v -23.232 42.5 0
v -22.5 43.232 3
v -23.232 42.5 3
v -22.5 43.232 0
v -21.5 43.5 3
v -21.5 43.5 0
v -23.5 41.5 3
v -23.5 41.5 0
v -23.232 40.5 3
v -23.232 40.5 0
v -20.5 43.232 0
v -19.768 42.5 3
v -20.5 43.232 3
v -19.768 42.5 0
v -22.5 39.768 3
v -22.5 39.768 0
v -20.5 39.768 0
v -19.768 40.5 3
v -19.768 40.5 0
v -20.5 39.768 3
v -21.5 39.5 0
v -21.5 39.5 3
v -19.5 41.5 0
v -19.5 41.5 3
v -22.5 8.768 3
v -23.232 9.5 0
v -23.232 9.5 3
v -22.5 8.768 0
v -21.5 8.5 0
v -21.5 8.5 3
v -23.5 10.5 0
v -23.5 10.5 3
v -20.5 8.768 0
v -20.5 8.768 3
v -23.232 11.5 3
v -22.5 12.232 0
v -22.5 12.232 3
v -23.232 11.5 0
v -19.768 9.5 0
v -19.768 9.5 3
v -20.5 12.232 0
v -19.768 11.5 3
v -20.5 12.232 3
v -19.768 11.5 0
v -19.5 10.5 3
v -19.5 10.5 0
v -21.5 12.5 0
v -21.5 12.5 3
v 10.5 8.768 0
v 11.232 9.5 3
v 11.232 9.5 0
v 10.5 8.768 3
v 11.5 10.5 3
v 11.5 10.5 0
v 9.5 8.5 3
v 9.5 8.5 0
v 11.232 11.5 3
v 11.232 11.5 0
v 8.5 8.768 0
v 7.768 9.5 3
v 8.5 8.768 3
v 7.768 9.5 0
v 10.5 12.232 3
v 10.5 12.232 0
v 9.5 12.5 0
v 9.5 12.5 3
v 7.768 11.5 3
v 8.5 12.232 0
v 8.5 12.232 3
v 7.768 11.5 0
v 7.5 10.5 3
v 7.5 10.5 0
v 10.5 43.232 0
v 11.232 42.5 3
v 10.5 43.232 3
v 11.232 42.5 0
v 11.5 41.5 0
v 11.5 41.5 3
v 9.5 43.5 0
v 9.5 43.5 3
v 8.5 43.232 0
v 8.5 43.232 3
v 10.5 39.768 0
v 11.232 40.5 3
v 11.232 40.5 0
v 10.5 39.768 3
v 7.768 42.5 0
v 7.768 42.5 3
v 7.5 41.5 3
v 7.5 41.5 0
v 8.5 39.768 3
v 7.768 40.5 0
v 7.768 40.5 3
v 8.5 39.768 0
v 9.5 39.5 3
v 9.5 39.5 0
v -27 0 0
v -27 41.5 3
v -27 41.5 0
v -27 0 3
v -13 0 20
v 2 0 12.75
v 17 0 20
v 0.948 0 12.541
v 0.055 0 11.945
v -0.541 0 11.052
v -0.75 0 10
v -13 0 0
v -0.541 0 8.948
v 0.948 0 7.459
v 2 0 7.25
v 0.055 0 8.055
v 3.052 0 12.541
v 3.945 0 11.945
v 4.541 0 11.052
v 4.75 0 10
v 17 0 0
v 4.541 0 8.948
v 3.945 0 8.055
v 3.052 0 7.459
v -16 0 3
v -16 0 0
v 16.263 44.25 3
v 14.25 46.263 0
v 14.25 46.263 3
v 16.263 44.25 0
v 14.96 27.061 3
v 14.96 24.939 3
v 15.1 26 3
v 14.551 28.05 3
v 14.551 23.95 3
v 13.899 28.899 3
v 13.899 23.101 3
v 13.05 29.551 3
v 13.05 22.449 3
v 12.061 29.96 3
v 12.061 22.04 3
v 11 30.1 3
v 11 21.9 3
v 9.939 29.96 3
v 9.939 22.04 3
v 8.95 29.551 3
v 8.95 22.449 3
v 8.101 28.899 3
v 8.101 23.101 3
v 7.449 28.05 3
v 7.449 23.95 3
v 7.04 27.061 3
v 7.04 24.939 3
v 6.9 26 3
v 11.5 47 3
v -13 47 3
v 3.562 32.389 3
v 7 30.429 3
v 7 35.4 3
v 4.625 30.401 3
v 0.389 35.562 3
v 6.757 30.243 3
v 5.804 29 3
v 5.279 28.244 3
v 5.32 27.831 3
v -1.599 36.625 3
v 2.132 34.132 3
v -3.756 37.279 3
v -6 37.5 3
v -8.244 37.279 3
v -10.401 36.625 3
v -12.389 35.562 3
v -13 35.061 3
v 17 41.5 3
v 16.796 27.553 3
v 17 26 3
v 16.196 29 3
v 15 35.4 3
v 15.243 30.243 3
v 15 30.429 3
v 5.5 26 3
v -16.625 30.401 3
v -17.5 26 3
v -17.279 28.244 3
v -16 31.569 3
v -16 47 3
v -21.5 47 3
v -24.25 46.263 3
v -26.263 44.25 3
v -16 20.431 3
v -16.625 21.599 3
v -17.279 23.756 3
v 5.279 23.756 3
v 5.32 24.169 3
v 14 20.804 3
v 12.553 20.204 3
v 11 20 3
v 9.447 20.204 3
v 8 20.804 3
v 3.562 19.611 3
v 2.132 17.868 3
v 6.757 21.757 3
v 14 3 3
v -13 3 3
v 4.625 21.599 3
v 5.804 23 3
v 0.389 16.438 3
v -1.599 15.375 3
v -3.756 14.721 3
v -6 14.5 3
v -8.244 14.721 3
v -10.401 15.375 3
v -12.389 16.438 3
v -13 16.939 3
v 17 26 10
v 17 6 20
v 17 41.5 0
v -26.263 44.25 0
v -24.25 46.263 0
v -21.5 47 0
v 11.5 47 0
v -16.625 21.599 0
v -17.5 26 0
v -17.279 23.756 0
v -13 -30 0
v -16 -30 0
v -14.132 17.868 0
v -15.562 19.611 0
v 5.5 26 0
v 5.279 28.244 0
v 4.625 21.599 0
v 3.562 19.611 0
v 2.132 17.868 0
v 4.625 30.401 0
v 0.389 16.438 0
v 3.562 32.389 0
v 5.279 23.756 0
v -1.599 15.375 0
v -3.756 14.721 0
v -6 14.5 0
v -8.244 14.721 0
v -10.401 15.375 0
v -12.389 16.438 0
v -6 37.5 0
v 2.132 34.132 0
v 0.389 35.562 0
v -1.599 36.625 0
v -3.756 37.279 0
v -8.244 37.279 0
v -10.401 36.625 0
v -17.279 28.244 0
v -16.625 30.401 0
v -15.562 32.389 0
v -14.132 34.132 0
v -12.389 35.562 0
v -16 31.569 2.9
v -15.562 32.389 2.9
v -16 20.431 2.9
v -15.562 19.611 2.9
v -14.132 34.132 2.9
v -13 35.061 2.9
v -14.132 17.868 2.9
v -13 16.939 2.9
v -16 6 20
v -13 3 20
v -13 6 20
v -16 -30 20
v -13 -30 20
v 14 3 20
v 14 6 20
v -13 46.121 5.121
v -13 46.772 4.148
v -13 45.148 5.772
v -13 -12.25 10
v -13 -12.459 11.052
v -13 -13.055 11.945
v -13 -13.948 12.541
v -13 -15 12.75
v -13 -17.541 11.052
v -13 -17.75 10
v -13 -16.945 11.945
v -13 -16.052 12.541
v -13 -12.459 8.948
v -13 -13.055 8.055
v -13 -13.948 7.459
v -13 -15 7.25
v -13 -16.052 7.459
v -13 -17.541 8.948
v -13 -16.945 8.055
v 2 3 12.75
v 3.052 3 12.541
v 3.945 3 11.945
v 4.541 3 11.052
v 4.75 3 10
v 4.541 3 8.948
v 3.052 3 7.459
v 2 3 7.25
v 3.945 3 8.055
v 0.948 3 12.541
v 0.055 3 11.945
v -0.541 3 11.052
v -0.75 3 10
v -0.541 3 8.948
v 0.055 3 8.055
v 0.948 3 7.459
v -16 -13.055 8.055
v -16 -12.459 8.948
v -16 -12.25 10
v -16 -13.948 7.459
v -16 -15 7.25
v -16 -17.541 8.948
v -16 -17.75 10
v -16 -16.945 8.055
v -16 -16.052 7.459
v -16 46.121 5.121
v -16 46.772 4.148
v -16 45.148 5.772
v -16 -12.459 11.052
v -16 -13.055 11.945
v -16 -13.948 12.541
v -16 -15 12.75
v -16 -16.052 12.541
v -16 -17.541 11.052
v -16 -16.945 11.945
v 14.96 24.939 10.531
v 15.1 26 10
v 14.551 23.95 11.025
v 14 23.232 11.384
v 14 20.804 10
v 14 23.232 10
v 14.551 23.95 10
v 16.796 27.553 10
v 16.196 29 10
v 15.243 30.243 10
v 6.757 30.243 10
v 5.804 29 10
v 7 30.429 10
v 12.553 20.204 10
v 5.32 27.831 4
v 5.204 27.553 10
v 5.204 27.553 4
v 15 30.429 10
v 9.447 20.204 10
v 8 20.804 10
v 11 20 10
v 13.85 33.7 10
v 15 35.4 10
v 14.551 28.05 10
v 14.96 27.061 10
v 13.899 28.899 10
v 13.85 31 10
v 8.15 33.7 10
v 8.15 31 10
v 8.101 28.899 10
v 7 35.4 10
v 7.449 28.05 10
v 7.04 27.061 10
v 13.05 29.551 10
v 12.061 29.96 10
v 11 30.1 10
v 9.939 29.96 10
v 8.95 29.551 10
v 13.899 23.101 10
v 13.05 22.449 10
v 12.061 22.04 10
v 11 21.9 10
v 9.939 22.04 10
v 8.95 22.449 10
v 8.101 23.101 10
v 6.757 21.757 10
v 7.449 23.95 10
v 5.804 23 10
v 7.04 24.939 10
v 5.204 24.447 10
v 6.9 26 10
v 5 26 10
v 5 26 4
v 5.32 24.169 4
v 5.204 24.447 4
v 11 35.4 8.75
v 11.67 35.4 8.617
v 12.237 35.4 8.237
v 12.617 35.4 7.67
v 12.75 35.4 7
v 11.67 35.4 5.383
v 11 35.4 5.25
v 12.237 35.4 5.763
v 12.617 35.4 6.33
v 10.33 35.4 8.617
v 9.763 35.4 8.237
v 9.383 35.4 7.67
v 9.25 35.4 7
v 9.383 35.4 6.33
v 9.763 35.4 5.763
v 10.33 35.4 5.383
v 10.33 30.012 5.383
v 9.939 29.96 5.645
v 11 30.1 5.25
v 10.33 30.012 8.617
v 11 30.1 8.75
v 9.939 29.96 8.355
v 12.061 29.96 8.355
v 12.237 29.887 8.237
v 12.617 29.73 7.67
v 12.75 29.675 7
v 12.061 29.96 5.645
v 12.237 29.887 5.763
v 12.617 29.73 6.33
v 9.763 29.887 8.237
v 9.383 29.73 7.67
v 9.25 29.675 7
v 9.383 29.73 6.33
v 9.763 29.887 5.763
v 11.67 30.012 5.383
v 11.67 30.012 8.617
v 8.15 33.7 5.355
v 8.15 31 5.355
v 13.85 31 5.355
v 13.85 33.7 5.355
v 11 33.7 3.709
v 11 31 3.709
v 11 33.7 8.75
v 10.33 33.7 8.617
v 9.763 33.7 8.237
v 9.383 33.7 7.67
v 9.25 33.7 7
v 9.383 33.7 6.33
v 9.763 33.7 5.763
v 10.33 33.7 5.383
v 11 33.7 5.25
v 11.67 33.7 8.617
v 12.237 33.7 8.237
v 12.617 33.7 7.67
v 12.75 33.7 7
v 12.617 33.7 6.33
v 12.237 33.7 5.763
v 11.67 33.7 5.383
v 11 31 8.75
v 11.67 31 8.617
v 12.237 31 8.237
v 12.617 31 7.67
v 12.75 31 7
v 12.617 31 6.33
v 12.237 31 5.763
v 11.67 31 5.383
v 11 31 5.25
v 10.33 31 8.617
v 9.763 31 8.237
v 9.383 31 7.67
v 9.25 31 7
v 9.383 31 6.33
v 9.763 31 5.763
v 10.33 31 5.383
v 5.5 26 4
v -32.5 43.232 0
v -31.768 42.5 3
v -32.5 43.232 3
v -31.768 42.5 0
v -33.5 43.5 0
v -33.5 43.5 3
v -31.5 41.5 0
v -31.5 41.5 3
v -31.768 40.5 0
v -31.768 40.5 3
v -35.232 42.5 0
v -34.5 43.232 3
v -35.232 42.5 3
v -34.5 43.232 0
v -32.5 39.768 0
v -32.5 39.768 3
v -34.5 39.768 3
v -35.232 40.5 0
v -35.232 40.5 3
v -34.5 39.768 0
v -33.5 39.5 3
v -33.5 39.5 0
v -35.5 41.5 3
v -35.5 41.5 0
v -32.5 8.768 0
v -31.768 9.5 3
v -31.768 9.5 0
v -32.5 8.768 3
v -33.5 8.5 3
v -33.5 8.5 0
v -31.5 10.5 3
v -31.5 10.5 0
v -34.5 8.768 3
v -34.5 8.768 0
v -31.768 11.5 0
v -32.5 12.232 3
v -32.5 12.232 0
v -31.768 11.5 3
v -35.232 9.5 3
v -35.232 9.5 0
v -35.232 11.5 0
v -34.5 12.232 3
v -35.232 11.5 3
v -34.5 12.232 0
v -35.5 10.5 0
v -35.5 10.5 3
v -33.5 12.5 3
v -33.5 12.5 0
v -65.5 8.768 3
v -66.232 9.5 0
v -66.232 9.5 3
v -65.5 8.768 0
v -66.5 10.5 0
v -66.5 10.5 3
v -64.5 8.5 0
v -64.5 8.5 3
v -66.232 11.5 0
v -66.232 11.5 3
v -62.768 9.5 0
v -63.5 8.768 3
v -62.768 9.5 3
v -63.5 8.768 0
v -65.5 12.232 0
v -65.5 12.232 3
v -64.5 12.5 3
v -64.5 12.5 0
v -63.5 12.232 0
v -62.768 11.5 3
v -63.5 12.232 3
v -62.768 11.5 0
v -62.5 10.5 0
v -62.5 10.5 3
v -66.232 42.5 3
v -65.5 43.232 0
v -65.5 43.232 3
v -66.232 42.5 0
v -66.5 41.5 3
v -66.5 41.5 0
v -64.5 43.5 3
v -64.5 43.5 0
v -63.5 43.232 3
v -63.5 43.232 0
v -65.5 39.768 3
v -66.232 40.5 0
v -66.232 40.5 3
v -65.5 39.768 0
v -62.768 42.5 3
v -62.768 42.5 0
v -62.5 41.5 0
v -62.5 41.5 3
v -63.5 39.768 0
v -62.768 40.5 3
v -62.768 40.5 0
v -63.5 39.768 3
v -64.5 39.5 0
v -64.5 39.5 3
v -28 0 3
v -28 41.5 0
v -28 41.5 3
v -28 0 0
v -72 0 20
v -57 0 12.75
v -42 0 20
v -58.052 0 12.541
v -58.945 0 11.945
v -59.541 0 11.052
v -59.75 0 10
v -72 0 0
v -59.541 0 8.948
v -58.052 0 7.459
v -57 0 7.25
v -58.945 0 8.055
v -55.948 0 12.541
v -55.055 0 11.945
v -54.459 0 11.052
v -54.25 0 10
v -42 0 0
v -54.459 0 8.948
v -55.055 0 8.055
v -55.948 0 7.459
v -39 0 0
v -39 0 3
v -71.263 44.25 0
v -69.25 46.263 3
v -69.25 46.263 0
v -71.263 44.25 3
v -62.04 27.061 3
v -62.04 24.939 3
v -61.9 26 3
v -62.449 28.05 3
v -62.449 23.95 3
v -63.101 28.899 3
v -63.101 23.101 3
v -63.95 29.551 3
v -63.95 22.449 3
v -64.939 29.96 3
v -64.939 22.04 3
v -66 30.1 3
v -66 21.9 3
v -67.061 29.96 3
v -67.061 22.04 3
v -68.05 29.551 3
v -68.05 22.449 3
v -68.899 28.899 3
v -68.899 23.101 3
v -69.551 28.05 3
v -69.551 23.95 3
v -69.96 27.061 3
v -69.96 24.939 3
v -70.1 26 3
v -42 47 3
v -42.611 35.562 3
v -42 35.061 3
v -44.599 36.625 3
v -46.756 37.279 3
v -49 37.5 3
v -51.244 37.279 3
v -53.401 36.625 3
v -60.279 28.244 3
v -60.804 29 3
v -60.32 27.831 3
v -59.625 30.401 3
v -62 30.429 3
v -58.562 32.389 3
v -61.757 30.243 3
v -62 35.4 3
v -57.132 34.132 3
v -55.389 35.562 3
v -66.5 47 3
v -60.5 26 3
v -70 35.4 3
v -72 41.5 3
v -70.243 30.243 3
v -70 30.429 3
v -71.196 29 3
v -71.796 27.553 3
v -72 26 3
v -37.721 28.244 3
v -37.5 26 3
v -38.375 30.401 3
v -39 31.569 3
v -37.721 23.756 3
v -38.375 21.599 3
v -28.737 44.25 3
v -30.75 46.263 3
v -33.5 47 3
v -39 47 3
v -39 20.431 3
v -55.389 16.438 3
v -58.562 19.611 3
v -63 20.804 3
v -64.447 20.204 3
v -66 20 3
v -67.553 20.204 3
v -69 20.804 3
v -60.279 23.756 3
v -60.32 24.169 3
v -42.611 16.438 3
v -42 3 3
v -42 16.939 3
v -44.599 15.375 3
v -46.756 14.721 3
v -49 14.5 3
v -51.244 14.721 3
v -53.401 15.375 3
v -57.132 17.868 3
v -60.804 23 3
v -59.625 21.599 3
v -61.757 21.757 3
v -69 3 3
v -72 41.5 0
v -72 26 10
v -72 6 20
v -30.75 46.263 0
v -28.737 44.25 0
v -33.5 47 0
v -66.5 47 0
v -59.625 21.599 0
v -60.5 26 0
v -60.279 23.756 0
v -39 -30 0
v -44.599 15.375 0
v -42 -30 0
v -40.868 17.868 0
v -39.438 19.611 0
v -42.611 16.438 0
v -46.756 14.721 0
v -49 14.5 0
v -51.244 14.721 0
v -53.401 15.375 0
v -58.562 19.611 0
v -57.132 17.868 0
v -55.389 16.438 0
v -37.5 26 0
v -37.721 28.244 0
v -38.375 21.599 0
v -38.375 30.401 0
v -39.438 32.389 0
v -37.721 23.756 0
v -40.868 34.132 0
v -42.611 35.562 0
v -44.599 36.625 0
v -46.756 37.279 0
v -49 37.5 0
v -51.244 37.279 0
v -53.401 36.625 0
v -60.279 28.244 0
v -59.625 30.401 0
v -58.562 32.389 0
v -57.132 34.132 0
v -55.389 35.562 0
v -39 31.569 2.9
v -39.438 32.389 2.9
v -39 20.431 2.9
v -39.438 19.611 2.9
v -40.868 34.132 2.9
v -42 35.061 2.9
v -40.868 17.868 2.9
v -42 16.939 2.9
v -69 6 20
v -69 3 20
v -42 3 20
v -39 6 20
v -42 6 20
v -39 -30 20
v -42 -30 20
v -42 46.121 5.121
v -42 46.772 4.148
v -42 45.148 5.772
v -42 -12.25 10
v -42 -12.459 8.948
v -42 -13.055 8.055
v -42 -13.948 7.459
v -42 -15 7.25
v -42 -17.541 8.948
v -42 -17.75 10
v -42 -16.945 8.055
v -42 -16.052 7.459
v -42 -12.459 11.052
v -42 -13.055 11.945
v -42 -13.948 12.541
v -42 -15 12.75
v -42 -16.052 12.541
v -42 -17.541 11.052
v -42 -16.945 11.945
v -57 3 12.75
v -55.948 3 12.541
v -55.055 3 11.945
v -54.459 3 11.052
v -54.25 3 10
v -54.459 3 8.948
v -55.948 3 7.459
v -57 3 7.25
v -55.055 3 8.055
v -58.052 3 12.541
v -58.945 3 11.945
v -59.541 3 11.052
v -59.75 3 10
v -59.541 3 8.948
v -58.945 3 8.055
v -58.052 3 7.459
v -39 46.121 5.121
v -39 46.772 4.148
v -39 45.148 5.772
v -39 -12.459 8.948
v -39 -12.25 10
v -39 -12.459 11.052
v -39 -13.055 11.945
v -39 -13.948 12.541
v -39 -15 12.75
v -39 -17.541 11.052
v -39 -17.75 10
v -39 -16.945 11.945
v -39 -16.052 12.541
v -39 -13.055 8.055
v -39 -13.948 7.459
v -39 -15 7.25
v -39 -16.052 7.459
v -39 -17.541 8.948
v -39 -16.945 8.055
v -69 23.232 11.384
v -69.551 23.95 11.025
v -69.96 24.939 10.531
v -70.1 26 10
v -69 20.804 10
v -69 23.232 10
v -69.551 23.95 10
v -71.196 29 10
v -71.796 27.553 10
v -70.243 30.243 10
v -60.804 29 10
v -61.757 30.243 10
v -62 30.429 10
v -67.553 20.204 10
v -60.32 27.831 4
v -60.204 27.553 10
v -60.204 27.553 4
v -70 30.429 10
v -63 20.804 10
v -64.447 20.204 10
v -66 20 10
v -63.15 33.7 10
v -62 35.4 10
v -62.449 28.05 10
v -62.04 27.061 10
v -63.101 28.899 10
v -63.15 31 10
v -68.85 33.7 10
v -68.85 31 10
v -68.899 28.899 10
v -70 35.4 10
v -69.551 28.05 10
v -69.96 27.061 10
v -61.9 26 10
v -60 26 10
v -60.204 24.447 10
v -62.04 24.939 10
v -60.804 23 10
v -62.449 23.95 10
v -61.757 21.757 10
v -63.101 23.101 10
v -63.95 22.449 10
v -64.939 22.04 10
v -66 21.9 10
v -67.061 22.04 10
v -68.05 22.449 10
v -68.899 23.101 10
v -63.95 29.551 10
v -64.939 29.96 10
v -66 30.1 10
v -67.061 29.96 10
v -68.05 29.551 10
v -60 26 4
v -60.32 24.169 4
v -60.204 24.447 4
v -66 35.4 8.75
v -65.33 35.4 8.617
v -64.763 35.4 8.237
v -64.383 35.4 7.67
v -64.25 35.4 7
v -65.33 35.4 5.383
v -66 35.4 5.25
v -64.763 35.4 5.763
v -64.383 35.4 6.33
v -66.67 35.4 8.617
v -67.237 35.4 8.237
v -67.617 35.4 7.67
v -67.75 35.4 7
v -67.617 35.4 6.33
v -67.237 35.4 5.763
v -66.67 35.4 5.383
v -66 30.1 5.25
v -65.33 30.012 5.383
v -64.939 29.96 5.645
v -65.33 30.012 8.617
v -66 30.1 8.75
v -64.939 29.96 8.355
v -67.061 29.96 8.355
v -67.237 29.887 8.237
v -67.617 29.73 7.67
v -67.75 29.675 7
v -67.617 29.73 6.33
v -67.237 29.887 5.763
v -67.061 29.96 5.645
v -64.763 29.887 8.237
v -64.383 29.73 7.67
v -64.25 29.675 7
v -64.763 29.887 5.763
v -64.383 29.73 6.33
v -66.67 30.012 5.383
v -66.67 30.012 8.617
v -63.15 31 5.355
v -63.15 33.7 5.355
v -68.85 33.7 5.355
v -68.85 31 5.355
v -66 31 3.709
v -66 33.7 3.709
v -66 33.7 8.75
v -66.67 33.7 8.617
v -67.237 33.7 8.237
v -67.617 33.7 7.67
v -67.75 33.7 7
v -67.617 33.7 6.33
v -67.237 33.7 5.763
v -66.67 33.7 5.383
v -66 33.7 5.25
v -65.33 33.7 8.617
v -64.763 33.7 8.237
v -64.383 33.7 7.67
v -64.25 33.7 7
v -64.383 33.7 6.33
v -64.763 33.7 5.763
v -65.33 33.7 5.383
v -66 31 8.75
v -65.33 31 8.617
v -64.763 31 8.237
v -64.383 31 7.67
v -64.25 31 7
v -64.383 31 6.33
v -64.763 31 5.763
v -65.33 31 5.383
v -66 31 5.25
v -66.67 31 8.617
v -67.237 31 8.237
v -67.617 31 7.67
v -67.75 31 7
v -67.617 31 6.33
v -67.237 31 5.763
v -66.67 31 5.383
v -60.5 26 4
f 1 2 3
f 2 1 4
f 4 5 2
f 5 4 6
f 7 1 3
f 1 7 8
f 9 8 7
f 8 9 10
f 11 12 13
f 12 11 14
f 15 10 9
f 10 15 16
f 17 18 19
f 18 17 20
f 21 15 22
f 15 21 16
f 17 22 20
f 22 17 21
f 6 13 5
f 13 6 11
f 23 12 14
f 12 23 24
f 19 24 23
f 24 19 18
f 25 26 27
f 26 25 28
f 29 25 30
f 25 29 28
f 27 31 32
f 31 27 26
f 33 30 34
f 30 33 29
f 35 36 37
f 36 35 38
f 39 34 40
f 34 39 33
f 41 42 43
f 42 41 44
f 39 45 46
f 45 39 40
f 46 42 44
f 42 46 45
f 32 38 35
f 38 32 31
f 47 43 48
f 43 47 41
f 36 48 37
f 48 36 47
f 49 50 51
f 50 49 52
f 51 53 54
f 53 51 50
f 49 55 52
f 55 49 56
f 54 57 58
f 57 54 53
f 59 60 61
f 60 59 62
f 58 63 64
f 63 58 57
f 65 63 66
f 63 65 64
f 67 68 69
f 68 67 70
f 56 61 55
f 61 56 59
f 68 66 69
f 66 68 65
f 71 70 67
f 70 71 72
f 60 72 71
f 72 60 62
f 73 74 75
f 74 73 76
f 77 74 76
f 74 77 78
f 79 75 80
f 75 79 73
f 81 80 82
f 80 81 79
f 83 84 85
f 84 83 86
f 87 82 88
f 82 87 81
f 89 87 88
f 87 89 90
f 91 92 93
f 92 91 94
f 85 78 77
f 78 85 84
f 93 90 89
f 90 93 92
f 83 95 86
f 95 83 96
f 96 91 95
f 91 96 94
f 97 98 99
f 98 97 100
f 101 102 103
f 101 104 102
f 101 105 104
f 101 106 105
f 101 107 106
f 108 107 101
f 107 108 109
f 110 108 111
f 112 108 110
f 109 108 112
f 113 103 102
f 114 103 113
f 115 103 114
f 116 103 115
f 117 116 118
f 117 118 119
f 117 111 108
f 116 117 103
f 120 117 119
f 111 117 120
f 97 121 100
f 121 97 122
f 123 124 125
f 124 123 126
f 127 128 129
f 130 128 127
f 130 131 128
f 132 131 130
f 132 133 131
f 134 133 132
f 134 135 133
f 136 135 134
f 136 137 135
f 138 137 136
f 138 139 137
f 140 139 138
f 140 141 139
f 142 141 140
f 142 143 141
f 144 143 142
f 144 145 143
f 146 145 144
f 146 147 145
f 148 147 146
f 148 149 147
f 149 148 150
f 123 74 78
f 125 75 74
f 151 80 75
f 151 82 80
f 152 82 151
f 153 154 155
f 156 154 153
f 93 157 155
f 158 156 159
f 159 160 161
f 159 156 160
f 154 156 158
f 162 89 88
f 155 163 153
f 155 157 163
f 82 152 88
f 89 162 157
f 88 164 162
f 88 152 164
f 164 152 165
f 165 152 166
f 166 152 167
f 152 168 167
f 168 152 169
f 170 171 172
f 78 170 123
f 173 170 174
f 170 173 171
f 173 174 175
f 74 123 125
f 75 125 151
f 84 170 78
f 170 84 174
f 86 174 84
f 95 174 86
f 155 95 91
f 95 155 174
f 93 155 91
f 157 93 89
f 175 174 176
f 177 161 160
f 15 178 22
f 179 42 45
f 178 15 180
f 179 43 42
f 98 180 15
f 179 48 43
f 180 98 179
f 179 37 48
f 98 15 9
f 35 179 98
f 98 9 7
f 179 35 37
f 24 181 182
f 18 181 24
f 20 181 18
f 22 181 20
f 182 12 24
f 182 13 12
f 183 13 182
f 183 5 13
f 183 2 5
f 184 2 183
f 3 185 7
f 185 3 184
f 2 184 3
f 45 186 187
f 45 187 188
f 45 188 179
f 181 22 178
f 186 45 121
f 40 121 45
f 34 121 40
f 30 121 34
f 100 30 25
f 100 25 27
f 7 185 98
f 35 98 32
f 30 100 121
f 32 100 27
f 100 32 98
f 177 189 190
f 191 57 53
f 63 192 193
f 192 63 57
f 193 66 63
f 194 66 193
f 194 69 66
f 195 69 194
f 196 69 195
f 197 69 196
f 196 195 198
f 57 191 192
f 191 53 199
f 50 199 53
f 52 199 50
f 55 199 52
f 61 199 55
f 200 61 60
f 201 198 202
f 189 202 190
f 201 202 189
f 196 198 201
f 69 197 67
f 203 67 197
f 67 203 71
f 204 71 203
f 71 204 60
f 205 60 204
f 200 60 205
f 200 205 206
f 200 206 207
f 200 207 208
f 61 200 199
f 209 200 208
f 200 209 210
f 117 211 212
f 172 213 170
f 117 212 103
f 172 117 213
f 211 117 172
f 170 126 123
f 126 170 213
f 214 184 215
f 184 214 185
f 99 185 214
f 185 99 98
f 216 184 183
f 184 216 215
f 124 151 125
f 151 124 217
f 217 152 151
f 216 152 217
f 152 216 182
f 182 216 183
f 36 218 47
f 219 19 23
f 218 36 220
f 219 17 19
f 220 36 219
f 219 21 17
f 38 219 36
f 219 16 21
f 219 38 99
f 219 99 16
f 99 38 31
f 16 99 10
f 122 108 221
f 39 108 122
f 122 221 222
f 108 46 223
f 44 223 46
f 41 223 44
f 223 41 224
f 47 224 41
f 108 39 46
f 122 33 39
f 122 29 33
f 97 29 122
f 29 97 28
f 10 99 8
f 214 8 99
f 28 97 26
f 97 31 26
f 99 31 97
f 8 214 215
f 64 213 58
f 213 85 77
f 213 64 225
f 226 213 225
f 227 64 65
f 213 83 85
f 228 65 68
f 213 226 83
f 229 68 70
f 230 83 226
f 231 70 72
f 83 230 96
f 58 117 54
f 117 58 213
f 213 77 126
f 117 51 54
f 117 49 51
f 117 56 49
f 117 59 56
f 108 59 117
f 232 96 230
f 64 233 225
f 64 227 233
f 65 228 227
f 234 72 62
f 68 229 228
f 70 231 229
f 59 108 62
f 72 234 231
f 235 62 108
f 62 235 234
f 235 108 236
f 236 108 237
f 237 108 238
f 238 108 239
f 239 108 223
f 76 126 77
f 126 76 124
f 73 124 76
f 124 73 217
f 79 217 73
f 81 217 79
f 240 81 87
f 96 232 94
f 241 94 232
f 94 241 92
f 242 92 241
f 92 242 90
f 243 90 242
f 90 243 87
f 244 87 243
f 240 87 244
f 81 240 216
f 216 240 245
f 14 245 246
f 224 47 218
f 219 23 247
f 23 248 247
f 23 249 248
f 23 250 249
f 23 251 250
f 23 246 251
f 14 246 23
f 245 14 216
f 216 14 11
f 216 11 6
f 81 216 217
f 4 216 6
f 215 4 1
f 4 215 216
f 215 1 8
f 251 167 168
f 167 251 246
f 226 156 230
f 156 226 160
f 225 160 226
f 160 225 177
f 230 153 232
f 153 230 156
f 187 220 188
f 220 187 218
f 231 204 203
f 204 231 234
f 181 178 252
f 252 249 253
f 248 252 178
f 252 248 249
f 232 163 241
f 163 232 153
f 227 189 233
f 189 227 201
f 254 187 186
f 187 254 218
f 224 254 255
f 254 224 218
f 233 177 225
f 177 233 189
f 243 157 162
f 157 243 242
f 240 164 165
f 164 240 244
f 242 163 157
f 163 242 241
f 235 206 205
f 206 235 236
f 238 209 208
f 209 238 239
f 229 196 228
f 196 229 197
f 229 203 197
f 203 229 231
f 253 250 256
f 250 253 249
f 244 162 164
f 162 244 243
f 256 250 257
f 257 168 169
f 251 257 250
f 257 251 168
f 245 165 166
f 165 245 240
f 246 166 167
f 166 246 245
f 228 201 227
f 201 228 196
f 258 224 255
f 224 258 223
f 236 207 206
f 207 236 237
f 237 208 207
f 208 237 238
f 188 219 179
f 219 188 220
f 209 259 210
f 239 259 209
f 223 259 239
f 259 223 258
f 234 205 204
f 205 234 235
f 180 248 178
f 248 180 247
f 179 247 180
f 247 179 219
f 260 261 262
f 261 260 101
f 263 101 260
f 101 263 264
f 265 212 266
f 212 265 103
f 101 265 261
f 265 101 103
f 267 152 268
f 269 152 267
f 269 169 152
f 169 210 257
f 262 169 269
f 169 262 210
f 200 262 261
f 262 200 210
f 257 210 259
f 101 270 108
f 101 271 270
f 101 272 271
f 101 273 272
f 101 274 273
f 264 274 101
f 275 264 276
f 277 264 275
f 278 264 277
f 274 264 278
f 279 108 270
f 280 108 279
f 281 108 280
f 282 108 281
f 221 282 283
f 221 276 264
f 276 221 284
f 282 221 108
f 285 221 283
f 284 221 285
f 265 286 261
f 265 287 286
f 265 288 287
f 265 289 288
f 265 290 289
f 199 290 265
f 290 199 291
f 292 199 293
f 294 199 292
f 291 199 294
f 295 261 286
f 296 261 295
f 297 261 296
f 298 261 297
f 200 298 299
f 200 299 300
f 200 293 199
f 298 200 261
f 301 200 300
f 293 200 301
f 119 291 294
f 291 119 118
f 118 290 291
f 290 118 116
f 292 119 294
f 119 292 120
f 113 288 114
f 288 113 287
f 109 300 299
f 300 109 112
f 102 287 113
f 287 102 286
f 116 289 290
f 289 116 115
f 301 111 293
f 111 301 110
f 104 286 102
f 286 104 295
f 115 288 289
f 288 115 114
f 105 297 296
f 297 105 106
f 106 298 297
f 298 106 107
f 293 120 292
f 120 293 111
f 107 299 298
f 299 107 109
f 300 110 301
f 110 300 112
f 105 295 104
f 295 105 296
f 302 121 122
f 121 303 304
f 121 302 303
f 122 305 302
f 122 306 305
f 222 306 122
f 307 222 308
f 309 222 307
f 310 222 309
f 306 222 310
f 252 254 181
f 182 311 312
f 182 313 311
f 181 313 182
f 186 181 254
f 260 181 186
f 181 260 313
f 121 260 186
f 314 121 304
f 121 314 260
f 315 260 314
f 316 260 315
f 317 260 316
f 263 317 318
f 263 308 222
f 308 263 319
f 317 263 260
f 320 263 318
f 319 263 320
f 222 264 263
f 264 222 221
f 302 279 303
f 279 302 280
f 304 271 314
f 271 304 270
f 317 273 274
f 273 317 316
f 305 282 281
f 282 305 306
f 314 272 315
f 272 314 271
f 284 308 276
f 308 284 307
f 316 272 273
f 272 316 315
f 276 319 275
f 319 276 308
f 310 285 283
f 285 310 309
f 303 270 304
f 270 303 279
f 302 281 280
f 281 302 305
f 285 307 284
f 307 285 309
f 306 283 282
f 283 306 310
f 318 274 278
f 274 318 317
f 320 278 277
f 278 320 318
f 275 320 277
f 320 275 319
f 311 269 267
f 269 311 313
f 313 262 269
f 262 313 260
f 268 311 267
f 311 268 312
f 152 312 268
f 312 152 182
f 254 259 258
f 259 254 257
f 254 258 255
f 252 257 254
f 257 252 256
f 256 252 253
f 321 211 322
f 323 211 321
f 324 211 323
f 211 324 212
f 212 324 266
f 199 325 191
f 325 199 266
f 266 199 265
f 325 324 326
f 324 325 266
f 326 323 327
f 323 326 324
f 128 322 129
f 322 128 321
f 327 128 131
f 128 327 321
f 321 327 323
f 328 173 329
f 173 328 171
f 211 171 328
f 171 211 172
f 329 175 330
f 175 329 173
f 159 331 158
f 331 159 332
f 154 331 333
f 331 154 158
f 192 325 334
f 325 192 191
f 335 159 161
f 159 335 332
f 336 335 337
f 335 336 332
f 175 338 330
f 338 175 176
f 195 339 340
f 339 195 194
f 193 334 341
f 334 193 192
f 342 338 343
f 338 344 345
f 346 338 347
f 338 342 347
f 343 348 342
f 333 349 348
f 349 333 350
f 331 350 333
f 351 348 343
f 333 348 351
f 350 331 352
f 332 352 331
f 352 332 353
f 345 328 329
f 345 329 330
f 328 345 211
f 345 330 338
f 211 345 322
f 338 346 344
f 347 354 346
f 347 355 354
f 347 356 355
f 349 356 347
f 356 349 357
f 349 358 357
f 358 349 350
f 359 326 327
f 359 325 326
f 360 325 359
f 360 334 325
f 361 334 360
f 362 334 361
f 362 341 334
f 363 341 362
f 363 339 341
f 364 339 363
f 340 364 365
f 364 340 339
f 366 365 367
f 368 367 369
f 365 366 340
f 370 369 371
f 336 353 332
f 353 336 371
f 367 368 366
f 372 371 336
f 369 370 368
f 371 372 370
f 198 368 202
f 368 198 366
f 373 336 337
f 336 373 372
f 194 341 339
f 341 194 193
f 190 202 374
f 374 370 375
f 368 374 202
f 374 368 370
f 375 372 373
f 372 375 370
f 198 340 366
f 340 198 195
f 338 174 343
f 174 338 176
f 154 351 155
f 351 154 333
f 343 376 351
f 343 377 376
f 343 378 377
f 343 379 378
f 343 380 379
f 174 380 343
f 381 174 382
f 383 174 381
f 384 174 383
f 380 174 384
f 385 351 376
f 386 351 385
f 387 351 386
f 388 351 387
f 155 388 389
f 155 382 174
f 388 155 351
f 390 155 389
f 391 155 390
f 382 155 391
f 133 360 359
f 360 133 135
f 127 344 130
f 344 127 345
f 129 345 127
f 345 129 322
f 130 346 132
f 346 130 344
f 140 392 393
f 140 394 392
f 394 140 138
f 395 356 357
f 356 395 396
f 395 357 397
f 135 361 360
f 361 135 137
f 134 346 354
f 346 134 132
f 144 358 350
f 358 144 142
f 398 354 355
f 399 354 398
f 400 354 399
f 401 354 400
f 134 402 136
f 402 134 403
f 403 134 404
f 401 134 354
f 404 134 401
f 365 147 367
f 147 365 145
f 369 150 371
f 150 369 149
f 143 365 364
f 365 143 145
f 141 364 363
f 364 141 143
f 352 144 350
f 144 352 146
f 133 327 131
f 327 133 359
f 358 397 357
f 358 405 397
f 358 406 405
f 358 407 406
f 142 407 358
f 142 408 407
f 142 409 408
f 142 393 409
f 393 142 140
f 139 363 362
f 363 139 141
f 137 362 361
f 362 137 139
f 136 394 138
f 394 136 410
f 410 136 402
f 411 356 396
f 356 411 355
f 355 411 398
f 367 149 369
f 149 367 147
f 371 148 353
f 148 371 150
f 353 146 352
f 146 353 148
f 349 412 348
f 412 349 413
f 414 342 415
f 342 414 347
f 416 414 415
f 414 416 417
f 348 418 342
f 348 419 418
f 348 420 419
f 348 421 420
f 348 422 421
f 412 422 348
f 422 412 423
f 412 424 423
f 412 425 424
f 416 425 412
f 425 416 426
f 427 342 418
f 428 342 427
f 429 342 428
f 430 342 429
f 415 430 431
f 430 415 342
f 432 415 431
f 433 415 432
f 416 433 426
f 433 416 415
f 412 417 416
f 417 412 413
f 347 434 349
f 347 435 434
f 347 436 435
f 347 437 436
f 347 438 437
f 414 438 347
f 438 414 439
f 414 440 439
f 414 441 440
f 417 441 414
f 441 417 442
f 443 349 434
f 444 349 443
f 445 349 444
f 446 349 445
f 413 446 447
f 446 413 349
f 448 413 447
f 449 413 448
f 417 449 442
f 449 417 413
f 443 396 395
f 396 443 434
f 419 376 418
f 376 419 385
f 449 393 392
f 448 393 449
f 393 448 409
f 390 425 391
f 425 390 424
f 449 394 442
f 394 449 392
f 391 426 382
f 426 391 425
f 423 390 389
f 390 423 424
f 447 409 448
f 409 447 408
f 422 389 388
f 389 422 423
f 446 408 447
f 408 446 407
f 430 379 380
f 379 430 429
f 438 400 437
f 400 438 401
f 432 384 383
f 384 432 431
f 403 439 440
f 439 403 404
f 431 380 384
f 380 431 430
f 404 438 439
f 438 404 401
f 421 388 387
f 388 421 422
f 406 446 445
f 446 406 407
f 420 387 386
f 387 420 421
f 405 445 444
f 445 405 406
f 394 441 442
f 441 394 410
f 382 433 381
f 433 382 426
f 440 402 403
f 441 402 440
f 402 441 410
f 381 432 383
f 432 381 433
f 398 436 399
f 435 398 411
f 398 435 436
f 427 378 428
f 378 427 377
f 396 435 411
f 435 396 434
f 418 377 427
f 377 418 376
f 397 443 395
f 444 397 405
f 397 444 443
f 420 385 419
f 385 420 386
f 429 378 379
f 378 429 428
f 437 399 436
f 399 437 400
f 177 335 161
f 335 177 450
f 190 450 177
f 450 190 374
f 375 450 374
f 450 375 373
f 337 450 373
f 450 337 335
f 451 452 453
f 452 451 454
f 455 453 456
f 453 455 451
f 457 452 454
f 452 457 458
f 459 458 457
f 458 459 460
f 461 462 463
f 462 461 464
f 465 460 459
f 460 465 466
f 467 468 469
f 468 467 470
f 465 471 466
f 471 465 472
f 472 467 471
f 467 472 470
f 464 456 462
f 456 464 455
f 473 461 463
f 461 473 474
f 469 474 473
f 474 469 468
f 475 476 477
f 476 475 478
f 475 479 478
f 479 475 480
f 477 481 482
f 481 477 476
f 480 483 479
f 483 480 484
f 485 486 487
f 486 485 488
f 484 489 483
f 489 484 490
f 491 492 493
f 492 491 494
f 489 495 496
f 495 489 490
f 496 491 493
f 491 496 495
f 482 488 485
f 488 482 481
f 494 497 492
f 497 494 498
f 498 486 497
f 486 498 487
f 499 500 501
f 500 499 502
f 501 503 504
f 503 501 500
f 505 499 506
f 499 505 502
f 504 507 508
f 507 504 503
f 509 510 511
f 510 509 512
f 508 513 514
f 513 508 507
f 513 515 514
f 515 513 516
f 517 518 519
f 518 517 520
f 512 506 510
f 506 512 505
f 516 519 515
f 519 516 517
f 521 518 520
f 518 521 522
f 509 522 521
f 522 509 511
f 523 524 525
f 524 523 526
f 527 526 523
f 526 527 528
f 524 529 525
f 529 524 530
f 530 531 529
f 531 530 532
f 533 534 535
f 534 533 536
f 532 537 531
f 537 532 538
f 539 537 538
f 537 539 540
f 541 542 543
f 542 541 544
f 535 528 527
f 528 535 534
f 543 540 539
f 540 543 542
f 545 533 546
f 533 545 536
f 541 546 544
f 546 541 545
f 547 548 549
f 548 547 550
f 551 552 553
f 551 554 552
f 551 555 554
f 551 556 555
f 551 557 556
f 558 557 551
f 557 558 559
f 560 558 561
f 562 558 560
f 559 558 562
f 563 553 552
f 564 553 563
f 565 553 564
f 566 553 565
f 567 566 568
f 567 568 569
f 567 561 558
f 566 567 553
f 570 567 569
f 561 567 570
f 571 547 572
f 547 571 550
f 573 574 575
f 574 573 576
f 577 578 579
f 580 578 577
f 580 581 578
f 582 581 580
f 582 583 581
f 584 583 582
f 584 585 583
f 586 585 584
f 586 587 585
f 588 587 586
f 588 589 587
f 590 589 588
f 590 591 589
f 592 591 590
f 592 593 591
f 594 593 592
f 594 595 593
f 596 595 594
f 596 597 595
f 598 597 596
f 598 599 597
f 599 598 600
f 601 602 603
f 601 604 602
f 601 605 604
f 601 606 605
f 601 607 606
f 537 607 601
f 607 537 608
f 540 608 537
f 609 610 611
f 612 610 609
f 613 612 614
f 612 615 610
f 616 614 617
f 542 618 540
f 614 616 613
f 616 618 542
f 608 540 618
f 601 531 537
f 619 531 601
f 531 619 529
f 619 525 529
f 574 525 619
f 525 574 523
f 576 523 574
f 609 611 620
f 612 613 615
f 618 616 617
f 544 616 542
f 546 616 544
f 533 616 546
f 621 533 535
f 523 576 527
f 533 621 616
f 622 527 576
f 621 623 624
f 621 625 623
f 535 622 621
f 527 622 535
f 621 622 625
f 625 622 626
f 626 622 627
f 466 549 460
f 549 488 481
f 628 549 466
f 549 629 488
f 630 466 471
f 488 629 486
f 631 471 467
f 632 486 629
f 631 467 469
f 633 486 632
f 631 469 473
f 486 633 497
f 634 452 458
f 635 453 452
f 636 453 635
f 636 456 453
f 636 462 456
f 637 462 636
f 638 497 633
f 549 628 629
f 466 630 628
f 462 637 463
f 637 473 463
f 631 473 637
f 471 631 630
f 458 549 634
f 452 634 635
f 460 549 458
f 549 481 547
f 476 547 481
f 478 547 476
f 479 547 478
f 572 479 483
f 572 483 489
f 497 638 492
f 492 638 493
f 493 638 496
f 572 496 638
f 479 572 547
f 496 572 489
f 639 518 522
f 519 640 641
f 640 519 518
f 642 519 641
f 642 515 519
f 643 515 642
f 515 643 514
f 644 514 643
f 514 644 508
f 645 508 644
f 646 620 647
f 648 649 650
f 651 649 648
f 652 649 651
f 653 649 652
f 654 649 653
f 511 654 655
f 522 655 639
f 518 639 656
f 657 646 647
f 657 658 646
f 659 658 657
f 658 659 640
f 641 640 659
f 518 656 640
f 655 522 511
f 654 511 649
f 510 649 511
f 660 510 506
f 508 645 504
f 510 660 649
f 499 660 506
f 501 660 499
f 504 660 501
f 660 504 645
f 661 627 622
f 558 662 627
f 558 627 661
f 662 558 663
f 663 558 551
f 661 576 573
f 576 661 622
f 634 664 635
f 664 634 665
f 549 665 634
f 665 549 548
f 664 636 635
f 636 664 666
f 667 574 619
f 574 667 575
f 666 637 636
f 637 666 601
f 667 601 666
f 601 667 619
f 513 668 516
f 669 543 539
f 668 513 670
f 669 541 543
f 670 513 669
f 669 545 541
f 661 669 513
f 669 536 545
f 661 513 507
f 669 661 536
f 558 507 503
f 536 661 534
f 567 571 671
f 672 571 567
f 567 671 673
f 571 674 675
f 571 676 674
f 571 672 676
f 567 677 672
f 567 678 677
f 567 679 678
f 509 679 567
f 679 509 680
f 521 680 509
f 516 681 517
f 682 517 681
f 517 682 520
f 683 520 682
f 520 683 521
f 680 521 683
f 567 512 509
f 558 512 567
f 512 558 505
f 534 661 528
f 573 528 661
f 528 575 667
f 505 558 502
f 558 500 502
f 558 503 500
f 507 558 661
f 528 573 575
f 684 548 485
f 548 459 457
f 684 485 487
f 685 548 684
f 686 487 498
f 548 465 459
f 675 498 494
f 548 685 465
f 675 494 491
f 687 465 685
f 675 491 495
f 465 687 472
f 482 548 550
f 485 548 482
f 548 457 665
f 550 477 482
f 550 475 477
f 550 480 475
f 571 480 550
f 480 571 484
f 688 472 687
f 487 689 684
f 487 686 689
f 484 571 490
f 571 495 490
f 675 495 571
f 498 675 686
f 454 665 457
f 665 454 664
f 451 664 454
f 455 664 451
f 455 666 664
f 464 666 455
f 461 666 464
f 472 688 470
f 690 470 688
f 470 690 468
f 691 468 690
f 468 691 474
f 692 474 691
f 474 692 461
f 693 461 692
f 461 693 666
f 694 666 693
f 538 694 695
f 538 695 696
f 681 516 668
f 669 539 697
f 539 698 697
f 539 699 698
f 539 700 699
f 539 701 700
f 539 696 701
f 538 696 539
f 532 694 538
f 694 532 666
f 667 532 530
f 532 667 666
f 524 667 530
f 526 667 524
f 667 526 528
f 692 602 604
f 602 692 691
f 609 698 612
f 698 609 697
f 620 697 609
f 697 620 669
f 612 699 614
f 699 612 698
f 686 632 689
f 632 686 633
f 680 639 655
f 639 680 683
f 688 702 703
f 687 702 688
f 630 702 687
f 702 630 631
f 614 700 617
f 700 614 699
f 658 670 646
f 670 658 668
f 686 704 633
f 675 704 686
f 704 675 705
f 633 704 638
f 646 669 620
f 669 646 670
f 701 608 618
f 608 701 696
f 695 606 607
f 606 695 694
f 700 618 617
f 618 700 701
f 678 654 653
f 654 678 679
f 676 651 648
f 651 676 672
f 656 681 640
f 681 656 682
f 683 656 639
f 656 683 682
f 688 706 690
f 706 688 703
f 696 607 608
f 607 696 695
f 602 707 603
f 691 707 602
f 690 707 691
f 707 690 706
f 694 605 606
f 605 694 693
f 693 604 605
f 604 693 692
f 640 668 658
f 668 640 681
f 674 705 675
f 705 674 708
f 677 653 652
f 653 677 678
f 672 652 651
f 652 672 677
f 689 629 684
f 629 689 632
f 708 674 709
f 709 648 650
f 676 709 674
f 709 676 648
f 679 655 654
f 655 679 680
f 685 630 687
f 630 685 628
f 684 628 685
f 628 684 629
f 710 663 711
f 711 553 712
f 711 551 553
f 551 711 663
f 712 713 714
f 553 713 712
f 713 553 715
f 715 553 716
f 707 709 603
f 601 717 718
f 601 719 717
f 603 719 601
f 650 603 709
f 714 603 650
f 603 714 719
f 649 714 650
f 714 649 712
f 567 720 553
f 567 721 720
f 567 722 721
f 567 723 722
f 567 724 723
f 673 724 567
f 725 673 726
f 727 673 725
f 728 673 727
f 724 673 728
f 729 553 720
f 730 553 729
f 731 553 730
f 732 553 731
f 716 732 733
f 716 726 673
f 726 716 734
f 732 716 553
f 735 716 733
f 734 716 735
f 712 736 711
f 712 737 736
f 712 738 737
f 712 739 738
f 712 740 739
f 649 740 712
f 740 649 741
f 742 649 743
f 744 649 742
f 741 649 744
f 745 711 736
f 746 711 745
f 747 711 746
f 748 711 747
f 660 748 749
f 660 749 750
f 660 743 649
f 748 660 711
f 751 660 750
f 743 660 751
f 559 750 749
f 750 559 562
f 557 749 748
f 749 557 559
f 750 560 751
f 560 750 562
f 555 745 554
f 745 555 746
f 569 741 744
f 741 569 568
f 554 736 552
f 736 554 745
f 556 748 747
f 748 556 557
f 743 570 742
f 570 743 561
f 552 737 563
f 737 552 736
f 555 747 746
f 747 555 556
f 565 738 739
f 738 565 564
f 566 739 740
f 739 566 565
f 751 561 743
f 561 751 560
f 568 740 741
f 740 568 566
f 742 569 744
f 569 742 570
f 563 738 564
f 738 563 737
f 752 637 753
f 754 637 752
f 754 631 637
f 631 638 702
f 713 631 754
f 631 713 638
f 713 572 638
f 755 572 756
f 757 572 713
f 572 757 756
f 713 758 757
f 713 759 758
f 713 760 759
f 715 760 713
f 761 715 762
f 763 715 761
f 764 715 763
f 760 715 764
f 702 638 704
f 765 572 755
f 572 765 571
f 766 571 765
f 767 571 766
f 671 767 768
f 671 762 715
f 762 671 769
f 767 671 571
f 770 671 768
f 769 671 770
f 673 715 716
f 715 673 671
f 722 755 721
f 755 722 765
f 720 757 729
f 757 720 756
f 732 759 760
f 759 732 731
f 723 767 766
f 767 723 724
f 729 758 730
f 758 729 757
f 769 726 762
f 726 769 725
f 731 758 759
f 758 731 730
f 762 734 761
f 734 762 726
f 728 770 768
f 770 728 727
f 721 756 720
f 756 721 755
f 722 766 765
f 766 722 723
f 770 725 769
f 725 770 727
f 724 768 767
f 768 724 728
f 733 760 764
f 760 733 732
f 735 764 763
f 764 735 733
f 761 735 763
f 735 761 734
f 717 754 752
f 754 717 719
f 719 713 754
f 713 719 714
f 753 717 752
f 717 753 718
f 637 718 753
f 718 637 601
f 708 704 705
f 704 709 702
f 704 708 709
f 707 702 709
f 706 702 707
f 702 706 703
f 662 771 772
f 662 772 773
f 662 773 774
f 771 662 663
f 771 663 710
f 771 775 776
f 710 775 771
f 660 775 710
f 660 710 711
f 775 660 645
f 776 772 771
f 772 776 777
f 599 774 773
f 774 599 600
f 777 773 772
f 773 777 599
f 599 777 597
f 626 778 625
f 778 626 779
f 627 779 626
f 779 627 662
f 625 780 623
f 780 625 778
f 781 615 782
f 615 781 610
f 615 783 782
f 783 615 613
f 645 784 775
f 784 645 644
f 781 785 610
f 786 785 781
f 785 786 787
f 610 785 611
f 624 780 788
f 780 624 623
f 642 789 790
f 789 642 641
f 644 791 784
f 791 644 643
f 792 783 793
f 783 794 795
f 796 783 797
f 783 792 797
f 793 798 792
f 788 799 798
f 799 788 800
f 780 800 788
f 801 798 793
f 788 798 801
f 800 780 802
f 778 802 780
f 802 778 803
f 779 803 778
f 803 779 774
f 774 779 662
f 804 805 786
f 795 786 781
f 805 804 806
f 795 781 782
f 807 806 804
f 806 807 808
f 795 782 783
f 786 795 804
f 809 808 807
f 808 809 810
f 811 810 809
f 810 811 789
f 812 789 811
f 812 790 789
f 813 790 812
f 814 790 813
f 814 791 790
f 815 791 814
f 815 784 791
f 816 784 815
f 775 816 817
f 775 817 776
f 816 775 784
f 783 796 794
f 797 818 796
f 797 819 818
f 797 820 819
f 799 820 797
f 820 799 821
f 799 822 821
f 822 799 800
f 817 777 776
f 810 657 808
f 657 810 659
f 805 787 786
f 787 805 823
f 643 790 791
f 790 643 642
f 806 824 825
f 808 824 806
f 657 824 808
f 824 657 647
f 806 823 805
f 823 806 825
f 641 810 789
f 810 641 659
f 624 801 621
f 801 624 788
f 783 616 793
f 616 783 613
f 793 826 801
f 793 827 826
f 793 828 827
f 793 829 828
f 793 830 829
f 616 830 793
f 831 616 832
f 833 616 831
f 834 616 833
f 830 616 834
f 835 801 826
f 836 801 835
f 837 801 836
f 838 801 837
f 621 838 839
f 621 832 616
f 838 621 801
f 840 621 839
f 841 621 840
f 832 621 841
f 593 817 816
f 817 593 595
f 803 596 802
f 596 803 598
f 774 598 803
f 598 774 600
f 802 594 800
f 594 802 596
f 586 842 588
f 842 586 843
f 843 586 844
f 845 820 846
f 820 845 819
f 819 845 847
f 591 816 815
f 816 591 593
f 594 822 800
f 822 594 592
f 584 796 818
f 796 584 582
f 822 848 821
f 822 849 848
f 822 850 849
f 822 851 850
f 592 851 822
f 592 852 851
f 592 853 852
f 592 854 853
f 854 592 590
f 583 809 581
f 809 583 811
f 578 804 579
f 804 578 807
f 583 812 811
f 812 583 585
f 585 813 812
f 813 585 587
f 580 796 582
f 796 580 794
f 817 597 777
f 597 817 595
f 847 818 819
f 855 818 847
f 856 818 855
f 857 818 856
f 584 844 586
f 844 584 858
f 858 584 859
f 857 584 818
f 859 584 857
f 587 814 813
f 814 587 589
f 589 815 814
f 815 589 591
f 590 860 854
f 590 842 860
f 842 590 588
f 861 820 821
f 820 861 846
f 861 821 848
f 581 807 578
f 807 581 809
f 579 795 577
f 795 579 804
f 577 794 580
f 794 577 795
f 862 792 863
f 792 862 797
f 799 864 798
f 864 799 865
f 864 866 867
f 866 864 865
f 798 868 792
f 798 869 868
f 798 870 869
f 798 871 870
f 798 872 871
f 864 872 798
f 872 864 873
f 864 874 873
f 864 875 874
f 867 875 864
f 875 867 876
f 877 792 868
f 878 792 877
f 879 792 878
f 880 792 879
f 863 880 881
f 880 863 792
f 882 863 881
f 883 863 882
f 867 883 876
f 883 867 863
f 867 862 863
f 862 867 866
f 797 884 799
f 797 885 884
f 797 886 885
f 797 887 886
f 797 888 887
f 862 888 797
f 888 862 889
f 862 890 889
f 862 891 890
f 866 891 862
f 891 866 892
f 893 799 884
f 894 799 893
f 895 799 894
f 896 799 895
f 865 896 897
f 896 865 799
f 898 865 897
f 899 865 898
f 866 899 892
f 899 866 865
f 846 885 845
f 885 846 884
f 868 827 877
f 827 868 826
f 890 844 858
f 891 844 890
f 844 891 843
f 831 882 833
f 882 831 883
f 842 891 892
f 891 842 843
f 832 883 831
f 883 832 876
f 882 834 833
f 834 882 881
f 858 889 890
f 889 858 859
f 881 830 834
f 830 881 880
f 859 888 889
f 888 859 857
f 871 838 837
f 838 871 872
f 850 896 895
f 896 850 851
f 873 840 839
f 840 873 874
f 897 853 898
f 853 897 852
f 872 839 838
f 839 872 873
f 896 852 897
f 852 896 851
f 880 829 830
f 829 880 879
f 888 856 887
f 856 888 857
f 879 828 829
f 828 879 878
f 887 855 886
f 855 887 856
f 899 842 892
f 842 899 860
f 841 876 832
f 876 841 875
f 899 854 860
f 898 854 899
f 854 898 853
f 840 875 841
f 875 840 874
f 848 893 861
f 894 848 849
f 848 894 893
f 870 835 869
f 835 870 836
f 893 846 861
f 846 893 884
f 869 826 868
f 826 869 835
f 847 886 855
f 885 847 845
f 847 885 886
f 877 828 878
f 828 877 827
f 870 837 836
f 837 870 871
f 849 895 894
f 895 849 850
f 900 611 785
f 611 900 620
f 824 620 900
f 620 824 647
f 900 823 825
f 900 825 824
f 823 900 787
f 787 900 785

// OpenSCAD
// file: modules.scad
// Fonctions personnalisées

//http://forum.openscad.org/Wish-mirror-copy-true-td10681.html
module copy_mirror(vec=[0,1,0])
{
    children();
    mirror(vec) children();
}

module ecrou(plat,h){
  cylinder(d=plat*2/sqrt(3), h=h, $fn=6);
}


module courroie(diam,longueur){
  color ("black")
  difference(){
    hull(){
      cylinder(d=diam+1, h=6, $fn=32);
      translate([longueur,0,0]) cylinder(d=diam+1, h=6, $fn=32);
    }
    translate([0,0,-1])
    hull(){
      cylinder(d=diam-1, h=8, $fn=32);
      translate([longueur,0,0]) cylinder(d=diam-1, h=8, $fn=32);
    }
  }
  
  
}
// file: config.scad
// Paramètres de la machine

decal=-30;            // décallage du chassis xz
hauteur=400;          // hauteur totale chassis
largeur=400;          // largeur totale chassis
longueur=470;         // longueur totale chassis
hauteur_base=90;      // hauteur de la base
entraxe_y=140;        // distance entre les tiges Ø8 axe Y
entraxe_x=45;         // distance entre les tiges Ø8 axe X

couleur=[1,0.6,0];


// Plats écrous
ec3=5.7;
ec4=7.2;
ec5=8.2;
ec6=10.2;

// Jeu sur plats pour les écrous glissants
jec=0.2;

// hauteur écrous
ec3h=2.4;
ec4h=3.2;
ec5h=4.7;
ec6h=5.2;

// Vis
vis3=3.5;
vis4=4.5;
vis5=5.5;
vis6=6.5;


// Paramètre des pièces et jeux

// écart plateau/courroie
// y_belt_holder
belt_h=13;      // écart entre la courroie et le plateau

// écart plateau/tiges lisses
// y_lm8uu
decal_plateau=12; // Décallage en Y

// décallage des tiges lisses Y
// support_tige8_y
decal_tiges=5;

// décallage moteur Y
// y_motor
decal_motory_z=11;
decal_motory_y=25;

// Equerres de fixation position fermée
eq_ec=10;      // écart entre profilés

// Fixations axe Z
pos_z=26;      // position des axes par rapport au profilé (>= 21)
hauteur_z=20;  // hauteur des fixations
entraxe_z=17;  // distance entre les tiges Ø8 et M5
// est ce que la tige de 8 dépasse du profilé de 30?
// si oui, on décale les fixations
decalx=max(-42/2+entraxe_z+8/2+2, 0);

// Roulements linéaires
lbd = 15; // diamètre ext
lbh = 24; // hauteur

// x_carriage
he_x=23;  // entraxe hotend x
he_y=23;  // entraxe hotend y
sen_x=20; // entraxe capteur x
sen_y=23; // entraxe capteur y

// sensor_holder
sen_ep=3;   // épaisseur
sen_d=12.5; // diamètre du capteur
sen_pos=0;  // décentrage en x du capteur
sen_z=7;    // position Z de la bague

// y_belt_idler
ybi_ep1=4;       // épaisseur de la partie fixe
ybi_ep2=4;       // épaisseur de la partie mobile
ybi_h=16;        // position de l'axe
ybi_ec=11;       // écart pour le passage du ou des roulement
ybi_vis=vis4;    // diamètre passage de vis (axe)
ybi_ecrou=ec4;   // plat écrou
ybi_ecrouh=ec4h; // hauteur écrou
ybi_long=60;     // longueur de la partie mobile entre axes
ybi_prof=15;     // largeur de la partie mobile


// nombre de dents des poulies
poulie=20;

// Pas des courroies
pas=2;

// diamètre des poulies
dpoulie=poulie*pas/3.1416;
// main file
// eLKa1
// z_axis_bottom
// GNU GPL v3
// lkiefer <blog.lkiefer.org> and contributors
// http://www.reprap.org/wiki/ELKa
// https://github.com/kimented/elka1

include <config.scad>;
use <modules.scad>;

module z_axis_bottom(){
  echo ("z_axis_bottom");
  ep=3;
  color(couleur)
  translate([-42/2+30/2,pos_z,0]){
    difference(){
      // base
      hull(){
        translate([31/2+decalx,31/2,0]) cylinder(d=(42-31), h=ep, $fn=12);
        translate([-31/2,31/2,0]) cylinder(d=(42-31), h=ep, $fn=12);
        translate([-42/2,-pos_z,0]) cube([42+decalx,1,ep]);
      }
      // trou axe moteur
      translate([0,0,-1]) cylinder(d=23, h=ep+2, $fn=32);
      // trous fix moteur
      for (i=[1:4]) rotate ([0,0,90*i]) translate([31/2,31/2,-1]) cylinder(d=4, h=ep+2, $fn=12);
    }
    // fixation face
    difference(){
      translate([-(30-42/2)+decalx,-pos_z,0]) cube([30,ep,hauteur_z]);
      translate([42/2-30/2+decalx, -pos_z-1,hauteur_z/2]) rotate([-90,0,0]) cylinder(h=ep+2, d=vis5, $fn=16);
    }
    // fixation coté
    difference(){
      translate([42/2-30-ep+decalx,-pos_z-30,0]) cube([ep,30,hauteur_z]);
      translate([42/2-30-ep+decalx-1,-pos_z-30/2,hauteur_z/2]) rotate([0,90,0]) cylinder(d=vis5, h=ep+2, $fn=16);}
    // nervure droite
    translate([-42+30+decalx,0,0])
    difference(){
      hull(){
        translate([0,42/2-ep,ep]) rotate([0,90,0]) cylinder(h=ep, d=2*ep, $fn=16);
        translate([0,-pos_z,0]) cube([ep,ep*2,hauteur_z]);
      }
      translate([-1,-pos_z-1,-1.1]) cube([ep+2, 42/2+pos_z+2, ep+1]);
    }
    translate([42/2+decalx-ep,0,0])
    // nervure gauche
    difference(){
      hull(){
        translate([0,-1,ep]) cube([ep,1,7]);
        translate([0,-pos_z,0]) cube([ep,ep*2,hauteur_z]);
      }
      translate([-1,-pos_z-1,-1.1]) cube([ep+2, 42/2+pos_z+2, ep+1]);
      //trou tige
      translate([-4-2+ep,0,ep]) cylinder(d=8+0.2, h=hauteur, $fn=24);
    }
    // tige 8 + ecrou prisonier
    translate([entraxe_z,0,0])
    difference(){
      union(){
        cylinder(d=8+2*2, h=7+ep, $fn=24);
        translate([-4,0,0]) cube([8,ec3h+8/2+3,7+ep]);
      }
      translate([0,0,ep]) cylinder(d=8+0.2, h=7+1, $fn=24);
      hull(){
        translate([0,8/2+1,ep+8/2]) rotate([-90,90,0]) ecrou(5.7,ec3h+0.3);
        translate([0,8/2+1,ep+8]) rotate([-90,90,0]) ecrou(5.7,ec3h+0.3);
      }
      translate([0,0,ep+8/2]) rotate([-90,90,0]) cylinder(d=vis3, h=8+8, $fn=16);
      // trou axe moteur
      translate([-entraxe_z,0,-1]) cylinder(d=23, h=ep+2, $fn=32);
    }
  }
}

/*module z_axis_bottom_r(){
  mirror([1,0,0]) z_axis_bottom_l();
}*/

z_axis_bottom();
translate([-55,0,0]) mirror([1,0,0]) z_axis_bottom();
